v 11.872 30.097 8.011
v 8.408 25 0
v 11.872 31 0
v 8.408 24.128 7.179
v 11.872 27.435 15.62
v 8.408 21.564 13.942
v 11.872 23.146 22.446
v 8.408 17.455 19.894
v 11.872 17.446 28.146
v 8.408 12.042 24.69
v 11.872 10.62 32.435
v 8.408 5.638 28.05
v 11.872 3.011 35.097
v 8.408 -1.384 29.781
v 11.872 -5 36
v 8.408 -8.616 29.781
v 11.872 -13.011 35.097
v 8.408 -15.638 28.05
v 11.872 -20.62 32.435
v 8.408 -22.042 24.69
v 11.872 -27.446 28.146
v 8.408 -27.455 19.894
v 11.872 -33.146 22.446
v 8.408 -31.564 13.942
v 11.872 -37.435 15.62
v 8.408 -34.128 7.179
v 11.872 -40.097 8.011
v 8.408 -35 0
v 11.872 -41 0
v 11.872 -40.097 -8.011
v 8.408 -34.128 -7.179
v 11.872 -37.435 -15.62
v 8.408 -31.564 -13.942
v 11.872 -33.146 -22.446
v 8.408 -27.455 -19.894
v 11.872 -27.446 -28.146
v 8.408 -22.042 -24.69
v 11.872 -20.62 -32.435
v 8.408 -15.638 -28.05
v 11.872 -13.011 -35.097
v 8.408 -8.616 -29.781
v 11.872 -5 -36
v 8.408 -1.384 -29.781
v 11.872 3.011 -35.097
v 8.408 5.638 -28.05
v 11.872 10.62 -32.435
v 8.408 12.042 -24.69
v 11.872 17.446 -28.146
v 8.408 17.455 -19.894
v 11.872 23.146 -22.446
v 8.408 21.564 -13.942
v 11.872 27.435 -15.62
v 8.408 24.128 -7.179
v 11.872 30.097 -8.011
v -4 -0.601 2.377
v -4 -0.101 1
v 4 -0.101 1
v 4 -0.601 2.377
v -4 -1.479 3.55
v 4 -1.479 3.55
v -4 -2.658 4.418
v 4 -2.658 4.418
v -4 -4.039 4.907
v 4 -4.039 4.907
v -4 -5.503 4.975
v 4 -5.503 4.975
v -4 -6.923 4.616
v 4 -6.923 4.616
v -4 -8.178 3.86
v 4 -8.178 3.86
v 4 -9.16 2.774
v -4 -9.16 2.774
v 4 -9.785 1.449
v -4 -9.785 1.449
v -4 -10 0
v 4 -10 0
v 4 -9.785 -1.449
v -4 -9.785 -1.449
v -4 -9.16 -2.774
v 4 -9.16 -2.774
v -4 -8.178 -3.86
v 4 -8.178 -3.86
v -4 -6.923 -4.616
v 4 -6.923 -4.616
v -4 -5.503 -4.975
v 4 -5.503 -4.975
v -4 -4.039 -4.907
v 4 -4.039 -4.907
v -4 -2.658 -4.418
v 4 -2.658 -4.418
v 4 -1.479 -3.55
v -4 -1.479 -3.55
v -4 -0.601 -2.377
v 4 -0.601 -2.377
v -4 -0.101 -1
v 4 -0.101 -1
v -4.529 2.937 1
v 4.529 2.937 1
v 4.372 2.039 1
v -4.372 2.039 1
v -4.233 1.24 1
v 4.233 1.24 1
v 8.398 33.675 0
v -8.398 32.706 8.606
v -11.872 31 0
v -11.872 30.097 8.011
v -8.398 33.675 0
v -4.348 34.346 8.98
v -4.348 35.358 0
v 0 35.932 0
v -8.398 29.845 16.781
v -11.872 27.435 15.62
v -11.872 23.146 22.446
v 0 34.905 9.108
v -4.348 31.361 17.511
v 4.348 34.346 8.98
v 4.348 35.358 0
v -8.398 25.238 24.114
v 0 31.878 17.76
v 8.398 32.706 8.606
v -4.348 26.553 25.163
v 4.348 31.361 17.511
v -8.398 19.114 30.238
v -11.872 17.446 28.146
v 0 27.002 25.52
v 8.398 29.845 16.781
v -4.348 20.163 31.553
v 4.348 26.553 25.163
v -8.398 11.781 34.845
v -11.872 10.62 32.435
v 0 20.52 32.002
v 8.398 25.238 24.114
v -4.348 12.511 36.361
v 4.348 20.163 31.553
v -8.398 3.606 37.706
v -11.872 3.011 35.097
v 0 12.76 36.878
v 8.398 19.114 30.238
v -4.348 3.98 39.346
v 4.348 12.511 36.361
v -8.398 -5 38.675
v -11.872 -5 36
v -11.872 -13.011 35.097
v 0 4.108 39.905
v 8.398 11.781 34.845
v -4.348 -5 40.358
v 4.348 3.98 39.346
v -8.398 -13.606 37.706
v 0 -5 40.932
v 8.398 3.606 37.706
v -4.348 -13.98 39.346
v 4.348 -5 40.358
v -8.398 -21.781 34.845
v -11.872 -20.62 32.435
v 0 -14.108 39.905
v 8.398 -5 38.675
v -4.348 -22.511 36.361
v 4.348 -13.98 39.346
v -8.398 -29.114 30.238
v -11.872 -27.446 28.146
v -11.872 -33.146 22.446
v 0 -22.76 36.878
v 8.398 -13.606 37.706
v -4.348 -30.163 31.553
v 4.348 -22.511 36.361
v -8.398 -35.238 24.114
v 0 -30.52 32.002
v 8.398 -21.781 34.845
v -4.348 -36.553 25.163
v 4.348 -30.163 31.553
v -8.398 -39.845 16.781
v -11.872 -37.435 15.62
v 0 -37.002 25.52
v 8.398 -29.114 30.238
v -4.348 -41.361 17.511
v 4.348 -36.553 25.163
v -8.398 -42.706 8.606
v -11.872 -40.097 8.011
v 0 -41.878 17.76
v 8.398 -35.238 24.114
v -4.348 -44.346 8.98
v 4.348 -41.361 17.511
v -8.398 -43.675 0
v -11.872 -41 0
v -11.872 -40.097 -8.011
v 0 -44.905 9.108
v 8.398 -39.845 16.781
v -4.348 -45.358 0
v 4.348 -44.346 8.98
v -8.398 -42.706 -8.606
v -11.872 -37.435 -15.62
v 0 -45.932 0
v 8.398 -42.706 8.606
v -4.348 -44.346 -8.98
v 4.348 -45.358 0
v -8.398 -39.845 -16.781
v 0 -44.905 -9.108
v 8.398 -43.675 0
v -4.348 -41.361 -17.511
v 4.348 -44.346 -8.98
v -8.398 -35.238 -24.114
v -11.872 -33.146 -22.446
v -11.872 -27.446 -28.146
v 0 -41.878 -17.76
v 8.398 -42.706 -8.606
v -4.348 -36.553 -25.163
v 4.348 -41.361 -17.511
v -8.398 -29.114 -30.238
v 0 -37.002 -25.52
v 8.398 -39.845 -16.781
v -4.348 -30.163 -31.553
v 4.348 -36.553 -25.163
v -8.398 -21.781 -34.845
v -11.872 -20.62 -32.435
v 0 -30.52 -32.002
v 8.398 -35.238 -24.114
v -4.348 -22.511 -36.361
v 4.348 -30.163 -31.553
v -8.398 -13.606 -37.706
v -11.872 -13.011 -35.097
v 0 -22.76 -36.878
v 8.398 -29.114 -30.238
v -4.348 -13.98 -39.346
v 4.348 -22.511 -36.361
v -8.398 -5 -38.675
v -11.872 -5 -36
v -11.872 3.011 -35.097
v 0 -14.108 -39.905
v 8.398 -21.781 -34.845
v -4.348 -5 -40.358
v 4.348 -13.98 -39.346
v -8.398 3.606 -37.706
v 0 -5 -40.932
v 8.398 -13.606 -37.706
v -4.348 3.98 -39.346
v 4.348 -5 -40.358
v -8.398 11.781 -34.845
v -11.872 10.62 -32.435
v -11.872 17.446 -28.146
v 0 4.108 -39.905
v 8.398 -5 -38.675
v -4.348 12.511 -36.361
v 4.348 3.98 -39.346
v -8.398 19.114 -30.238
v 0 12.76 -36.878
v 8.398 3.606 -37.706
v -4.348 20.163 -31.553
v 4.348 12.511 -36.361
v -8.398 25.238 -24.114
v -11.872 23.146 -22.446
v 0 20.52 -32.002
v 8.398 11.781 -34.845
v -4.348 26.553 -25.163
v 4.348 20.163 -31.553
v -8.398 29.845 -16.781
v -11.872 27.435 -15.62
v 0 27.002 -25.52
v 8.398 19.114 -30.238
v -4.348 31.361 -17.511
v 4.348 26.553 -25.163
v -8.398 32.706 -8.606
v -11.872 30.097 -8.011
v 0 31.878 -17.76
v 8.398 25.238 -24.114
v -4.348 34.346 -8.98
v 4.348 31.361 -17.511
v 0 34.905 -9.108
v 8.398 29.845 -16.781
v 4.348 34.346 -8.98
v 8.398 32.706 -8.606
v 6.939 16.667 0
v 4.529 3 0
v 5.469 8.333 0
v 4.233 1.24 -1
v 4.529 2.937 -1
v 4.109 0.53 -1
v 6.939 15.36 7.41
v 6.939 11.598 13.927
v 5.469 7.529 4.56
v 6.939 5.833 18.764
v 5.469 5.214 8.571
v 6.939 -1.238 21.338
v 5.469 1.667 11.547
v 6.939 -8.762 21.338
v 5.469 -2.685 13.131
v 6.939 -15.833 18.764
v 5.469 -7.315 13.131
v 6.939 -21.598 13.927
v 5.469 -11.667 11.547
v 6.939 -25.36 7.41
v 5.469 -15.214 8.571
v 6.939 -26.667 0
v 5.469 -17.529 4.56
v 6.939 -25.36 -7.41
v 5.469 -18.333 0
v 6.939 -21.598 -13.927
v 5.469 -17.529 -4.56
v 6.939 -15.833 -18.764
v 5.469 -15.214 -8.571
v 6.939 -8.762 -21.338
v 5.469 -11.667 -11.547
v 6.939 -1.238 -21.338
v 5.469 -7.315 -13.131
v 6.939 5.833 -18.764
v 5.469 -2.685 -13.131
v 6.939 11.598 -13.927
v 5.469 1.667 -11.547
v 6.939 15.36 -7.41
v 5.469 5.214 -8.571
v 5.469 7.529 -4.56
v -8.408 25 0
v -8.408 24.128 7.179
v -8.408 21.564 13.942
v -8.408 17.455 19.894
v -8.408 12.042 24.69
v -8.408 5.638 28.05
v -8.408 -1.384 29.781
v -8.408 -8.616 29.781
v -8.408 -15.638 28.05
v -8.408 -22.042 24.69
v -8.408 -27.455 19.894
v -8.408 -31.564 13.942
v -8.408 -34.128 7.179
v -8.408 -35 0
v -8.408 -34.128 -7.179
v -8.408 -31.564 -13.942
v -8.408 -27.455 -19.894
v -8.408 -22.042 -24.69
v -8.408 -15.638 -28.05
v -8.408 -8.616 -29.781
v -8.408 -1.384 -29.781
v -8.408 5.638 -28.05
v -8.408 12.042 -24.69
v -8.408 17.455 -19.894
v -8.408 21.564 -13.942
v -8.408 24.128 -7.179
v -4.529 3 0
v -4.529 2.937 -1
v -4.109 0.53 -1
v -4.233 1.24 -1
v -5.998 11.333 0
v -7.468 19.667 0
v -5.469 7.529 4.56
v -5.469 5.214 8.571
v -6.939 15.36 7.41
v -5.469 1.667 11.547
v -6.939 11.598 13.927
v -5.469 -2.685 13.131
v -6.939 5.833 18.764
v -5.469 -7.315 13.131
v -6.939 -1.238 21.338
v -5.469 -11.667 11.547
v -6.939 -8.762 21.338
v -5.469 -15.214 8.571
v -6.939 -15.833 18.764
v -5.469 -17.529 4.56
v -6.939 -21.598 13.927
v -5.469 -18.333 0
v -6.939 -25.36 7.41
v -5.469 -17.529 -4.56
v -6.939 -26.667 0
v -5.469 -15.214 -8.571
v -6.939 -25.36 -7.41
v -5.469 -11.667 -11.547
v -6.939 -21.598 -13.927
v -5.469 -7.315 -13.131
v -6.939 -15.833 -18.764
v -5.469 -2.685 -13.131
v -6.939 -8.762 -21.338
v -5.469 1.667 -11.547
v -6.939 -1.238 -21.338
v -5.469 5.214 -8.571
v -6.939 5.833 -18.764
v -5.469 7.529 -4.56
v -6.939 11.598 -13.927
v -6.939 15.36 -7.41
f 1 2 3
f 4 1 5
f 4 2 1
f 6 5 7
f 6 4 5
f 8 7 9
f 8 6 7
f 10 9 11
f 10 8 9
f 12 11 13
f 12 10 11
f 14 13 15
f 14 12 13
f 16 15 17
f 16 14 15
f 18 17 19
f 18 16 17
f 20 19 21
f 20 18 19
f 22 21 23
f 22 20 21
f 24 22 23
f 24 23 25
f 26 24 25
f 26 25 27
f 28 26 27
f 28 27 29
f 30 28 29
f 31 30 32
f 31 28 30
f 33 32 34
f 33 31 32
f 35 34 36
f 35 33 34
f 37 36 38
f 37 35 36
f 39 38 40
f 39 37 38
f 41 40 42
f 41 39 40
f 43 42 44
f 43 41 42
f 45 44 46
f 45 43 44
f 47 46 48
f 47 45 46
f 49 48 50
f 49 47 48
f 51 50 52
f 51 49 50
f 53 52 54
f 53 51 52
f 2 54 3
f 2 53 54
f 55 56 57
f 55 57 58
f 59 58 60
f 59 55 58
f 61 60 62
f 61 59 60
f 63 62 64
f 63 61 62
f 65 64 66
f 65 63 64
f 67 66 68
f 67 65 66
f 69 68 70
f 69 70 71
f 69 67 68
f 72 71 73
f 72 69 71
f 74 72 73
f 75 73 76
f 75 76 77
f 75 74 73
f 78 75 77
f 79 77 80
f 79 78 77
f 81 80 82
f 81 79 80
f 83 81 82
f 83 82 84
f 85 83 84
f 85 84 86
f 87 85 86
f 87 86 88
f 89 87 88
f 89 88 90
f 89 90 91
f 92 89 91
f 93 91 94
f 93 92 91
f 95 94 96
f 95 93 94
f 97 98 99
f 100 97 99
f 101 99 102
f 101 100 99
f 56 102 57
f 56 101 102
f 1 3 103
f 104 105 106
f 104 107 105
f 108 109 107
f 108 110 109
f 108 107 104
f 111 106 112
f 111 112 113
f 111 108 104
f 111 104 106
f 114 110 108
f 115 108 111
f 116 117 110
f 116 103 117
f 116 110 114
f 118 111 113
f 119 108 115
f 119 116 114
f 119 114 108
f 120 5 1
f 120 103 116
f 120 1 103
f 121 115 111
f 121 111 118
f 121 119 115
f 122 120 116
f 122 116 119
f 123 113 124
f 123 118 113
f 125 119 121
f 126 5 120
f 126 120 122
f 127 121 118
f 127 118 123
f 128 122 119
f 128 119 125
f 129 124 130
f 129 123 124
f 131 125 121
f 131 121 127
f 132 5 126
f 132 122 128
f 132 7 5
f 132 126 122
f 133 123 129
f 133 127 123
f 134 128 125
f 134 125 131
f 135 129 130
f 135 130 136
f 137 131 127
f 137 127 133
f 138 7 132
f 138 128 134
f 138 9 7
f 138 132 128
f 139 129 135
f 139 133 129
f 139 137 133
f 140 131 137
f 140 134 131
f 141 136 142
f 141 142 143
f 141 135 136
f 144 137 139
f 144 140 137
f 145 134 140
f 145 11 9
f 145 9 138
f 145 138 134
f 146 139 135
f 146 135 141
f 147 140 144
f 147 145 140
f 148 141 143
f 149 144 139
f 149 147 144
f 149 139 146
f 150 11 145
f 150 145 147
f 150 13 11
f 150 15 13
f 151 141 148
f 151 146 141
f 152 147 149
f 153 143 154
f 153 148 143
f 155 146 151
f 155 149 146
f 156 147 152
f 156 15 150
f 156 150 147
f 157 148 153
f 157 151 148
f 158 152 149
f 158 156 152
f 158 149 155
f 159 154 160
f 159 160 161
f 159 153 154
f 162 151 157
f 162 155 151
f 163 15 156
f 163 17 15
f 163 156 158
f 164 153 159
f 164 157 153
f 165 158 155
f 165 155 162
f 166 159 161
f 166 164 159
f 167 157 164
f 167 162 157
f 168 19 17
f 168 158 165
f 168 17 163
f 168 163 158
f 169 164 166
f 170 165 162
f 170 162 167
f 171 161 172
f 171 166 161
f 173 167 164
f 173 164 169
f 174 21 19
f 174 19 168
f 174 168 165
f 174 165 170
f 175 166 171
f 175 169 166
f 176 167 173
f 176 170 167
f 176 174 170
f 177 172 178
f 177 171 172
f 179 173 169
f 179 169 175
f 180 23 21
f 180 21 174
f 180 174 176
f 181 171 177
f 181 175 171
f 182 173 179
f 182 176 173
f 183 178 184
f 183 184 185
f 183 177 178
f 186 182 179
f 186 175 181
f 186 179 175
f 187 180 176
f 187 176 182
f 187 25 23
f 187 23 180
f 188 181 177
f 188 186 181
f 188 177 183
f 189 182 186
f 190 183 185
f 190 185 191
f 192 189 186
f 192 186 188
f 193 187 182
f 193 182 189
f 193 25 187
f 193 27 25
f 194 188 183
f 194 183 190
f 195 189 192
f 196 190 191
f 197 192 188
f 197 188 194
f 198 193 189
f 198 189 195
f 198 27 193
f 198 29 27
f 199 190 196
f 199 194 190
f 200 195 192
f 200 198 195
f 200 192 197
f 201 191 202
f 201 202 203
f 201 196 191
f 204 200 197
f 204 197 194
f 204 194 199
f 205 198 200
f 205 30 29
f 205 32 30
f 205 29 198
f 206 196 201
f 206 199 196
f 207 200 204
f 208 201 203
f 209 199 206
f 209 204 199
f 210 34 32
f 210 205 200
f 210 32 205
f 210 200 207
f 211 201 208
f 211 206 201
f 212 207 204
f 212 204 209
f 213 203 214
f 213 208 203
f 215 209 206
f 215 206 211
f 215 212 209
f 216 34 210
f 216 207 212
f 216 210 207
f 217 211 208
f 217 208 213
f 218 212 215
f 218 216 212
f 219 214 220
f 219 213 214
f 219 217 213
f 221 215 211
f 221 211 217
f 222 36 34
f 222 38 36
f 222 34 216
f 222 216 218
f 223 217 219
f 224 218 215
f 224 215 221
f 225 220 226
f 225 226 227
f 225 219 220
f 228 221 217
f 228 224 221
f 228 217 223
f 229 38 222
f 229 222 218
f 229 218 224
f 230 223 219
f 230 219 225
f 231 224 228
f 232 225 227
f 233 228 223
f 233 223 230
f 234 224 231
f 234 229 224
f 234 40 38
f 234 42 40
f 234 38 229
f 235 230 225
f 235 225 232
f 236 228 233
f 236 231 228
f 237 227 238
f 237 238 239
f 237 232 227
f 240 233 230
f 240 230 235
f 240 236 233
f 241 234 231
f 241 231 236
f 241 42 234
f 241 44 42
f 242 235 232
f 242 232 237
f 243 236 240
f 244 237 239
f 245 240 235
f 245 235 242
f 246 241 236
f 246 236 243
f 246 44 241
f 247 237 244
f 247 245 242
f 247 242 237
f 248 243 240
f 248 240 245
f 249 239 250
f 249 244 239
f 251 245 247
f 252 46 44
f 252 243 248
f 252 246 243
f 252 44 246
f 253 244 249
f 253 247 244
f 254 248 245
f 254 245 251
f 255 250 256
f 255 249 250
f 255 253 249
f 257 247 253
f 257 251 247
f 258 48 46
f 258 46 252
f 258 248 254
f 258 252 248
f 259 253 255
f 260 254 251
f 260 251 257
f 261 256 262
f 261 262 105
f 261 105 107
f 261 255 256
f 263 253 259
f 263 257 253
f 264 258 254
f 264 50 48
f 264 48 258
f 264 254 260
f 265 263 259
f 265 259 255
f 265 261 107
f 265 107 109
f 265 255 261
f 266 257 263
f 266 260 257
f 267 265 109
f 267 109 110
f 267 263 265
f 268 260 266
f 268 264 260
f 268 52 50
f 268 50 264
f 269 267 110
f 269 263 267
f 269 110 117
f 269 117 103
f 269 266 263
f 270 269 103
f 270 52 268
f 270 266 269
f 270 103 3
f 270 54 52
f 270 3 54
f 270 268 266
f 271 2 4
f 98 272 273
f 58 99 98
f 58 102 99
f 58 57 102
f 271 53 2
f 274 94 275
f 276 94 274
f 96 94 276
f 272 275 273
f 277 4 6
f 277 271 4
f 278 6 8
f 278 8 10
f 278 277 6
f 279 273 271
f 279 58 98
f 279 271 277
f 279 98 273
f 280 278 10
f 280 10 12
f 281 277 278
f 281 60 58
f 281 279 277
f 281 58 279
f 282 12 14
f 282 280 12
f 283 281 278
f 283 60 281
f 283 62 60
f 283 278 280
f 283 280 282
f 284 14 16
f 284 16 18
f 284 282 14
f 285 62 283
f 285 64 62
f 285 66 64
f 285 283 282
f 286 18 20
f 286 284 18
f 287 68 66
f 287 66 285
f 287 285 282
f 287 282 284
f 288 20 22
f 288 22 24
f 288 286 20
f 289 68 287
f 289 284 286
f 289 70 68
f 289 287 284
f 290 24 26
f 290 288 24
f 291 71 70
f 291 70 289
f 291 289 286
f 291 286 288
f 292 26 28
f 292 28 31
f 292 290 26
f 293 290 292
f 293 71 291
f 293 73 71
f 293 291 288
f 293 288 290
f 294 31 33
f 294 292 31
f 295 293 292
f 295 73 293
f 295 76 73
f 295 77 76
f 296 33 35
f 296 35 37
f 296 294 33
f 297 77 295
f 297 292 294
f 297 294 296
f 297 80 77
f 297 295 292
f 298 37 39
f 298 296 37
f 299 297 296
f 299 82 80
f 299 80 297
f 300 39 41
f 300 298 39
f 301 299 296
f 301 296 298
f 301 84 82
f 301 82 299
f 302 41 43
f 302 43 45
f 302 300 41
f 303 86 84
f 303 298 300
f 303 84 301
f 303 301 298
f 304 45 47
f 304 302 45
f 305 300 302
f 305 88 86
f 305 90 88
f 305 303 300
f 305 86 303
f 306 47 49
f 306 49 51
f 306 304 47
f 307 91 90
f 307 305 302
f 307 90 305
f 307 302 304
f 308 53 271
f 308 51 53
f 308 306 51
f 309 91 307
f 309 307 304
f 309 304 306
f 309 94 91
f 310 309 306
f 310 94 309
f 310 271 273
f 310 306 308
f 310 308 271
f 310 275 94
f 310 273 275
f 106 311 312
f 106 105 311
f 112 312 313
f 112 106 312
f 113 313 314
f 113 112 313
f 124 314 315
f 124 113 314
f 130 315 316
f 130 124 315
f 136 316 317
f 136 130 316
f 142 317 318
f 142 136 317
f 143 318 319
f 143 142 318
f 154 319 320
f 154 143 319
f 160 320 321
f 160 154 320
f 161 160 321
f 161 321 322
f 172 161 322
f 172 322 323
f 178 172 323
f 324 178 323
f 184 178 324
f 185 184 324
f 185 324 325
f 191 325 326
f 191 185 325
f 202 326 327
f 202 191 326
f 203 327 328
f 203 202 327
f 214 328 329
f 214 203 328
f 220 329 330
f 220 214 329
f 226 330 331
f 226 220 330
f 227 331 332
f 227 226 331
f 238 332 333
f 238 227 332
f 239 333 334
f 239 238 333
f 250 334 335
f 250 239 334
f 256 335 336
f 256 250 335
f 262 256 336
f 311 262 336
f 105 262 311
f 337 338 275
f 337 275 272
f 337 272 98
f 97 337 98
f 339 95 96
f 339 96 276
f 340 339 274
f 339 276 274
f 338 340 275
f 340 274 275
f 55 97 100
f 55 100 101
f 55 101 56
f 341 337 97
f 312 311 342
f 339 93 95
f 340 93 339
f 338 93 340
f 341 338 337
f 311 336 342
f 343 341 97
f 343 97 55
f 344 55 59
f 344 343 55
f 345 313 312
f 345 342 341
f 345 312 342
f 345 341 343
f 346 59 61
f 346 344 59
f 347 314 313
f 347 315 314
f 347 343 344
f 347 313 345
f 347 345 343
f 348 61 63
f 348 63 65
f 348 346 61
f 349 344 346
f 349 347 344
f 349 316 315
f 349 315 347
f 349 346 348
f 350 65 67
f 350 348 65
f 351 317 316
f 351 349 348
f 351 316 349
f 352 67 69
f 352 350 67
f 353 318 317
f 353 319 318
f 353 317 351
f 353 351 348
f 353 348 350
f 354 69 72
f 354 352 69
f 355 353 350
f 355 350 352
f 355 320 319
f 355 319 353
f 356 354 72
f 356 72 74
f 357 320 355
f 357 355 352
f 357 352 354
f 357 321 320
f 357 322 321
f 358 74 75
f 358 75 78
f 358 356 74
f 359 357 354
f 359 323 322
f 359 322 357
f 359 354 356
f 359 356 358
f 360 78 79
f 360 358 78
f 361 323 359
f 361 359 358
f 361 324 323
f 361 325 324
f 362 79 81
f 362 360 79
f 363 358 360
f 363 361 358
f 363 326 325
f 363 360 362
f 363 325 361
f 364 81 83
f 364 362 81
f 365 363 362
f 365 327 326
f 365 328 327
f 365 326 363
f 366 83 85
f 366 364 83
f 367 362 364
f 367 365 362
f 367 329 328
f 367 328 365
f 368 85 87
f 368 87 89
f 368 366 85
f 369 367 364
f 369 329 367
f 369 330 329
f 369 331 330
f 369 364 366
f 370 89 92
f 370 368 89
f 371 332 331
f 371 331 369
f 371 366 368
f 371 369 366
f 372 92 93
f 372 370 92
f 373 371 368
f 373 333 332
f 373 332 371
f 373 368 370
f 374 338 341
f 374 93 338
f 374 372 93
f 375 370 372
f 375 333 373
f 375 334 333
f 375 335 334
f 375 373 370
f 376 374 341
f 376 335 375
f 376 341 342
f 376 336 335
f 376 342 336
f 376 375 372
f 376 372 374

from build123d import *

# Parameters (mm, degrees)
CUT_EXTRUDE3_DEPTH      = 20
CUT_EXTRUDE3_DEPTH_BACK = 200.5


with BuildPart() as part:
    # Sketch1 → Revolve1 (revolve)
    with BuildSketch(Plane.XY):
        with BuildLine():
            Line((4, 0), (-4, 0))
            Line((-4, 0), (-8.408174518, 25))
            Line((-8.408174518, 25), (-11.872276133, 31))
            ThreePointArc((-11.872276133, 31), (0, 35.931604452), (11.872276133, 31))
            Line((11.872276133, 31), (8.408174518, 25))
            Line((8.408174518, 25), (4, 0))
        make_face()
    revolve(axis=Axis((-4, -5, 0), (1, 0, 0)))

    # Sketch2 → Cut-Extrude3 (cut, two sides)
    with BuildSketch(Plane(origin=(0, 0, 0), x_dir=(0, 0, -1), z_dir=(1, 0, 0))) as cut_extrude3_sk:
        with BuildLine():
            Line((-1, -5), (1, -5))
            Line((1, -5), (1, 2.937253933))
            ThreePointArc((1, 2.937253933), (0, 3), (-1, 2.937253933))
            Line((-1, 2.937253933), (-1, -5))
        make_face()
    extrude(amount=CUT_EXTRUDE3_DEPTH, mode=Mode.SUBTRACT)
    extrude(cut_extrude3_sk.sketch, amount=-CUT_EXTRUDE3_DEPTH_BACK, mode=Mode.SUBTRACT)


solid = part.part
